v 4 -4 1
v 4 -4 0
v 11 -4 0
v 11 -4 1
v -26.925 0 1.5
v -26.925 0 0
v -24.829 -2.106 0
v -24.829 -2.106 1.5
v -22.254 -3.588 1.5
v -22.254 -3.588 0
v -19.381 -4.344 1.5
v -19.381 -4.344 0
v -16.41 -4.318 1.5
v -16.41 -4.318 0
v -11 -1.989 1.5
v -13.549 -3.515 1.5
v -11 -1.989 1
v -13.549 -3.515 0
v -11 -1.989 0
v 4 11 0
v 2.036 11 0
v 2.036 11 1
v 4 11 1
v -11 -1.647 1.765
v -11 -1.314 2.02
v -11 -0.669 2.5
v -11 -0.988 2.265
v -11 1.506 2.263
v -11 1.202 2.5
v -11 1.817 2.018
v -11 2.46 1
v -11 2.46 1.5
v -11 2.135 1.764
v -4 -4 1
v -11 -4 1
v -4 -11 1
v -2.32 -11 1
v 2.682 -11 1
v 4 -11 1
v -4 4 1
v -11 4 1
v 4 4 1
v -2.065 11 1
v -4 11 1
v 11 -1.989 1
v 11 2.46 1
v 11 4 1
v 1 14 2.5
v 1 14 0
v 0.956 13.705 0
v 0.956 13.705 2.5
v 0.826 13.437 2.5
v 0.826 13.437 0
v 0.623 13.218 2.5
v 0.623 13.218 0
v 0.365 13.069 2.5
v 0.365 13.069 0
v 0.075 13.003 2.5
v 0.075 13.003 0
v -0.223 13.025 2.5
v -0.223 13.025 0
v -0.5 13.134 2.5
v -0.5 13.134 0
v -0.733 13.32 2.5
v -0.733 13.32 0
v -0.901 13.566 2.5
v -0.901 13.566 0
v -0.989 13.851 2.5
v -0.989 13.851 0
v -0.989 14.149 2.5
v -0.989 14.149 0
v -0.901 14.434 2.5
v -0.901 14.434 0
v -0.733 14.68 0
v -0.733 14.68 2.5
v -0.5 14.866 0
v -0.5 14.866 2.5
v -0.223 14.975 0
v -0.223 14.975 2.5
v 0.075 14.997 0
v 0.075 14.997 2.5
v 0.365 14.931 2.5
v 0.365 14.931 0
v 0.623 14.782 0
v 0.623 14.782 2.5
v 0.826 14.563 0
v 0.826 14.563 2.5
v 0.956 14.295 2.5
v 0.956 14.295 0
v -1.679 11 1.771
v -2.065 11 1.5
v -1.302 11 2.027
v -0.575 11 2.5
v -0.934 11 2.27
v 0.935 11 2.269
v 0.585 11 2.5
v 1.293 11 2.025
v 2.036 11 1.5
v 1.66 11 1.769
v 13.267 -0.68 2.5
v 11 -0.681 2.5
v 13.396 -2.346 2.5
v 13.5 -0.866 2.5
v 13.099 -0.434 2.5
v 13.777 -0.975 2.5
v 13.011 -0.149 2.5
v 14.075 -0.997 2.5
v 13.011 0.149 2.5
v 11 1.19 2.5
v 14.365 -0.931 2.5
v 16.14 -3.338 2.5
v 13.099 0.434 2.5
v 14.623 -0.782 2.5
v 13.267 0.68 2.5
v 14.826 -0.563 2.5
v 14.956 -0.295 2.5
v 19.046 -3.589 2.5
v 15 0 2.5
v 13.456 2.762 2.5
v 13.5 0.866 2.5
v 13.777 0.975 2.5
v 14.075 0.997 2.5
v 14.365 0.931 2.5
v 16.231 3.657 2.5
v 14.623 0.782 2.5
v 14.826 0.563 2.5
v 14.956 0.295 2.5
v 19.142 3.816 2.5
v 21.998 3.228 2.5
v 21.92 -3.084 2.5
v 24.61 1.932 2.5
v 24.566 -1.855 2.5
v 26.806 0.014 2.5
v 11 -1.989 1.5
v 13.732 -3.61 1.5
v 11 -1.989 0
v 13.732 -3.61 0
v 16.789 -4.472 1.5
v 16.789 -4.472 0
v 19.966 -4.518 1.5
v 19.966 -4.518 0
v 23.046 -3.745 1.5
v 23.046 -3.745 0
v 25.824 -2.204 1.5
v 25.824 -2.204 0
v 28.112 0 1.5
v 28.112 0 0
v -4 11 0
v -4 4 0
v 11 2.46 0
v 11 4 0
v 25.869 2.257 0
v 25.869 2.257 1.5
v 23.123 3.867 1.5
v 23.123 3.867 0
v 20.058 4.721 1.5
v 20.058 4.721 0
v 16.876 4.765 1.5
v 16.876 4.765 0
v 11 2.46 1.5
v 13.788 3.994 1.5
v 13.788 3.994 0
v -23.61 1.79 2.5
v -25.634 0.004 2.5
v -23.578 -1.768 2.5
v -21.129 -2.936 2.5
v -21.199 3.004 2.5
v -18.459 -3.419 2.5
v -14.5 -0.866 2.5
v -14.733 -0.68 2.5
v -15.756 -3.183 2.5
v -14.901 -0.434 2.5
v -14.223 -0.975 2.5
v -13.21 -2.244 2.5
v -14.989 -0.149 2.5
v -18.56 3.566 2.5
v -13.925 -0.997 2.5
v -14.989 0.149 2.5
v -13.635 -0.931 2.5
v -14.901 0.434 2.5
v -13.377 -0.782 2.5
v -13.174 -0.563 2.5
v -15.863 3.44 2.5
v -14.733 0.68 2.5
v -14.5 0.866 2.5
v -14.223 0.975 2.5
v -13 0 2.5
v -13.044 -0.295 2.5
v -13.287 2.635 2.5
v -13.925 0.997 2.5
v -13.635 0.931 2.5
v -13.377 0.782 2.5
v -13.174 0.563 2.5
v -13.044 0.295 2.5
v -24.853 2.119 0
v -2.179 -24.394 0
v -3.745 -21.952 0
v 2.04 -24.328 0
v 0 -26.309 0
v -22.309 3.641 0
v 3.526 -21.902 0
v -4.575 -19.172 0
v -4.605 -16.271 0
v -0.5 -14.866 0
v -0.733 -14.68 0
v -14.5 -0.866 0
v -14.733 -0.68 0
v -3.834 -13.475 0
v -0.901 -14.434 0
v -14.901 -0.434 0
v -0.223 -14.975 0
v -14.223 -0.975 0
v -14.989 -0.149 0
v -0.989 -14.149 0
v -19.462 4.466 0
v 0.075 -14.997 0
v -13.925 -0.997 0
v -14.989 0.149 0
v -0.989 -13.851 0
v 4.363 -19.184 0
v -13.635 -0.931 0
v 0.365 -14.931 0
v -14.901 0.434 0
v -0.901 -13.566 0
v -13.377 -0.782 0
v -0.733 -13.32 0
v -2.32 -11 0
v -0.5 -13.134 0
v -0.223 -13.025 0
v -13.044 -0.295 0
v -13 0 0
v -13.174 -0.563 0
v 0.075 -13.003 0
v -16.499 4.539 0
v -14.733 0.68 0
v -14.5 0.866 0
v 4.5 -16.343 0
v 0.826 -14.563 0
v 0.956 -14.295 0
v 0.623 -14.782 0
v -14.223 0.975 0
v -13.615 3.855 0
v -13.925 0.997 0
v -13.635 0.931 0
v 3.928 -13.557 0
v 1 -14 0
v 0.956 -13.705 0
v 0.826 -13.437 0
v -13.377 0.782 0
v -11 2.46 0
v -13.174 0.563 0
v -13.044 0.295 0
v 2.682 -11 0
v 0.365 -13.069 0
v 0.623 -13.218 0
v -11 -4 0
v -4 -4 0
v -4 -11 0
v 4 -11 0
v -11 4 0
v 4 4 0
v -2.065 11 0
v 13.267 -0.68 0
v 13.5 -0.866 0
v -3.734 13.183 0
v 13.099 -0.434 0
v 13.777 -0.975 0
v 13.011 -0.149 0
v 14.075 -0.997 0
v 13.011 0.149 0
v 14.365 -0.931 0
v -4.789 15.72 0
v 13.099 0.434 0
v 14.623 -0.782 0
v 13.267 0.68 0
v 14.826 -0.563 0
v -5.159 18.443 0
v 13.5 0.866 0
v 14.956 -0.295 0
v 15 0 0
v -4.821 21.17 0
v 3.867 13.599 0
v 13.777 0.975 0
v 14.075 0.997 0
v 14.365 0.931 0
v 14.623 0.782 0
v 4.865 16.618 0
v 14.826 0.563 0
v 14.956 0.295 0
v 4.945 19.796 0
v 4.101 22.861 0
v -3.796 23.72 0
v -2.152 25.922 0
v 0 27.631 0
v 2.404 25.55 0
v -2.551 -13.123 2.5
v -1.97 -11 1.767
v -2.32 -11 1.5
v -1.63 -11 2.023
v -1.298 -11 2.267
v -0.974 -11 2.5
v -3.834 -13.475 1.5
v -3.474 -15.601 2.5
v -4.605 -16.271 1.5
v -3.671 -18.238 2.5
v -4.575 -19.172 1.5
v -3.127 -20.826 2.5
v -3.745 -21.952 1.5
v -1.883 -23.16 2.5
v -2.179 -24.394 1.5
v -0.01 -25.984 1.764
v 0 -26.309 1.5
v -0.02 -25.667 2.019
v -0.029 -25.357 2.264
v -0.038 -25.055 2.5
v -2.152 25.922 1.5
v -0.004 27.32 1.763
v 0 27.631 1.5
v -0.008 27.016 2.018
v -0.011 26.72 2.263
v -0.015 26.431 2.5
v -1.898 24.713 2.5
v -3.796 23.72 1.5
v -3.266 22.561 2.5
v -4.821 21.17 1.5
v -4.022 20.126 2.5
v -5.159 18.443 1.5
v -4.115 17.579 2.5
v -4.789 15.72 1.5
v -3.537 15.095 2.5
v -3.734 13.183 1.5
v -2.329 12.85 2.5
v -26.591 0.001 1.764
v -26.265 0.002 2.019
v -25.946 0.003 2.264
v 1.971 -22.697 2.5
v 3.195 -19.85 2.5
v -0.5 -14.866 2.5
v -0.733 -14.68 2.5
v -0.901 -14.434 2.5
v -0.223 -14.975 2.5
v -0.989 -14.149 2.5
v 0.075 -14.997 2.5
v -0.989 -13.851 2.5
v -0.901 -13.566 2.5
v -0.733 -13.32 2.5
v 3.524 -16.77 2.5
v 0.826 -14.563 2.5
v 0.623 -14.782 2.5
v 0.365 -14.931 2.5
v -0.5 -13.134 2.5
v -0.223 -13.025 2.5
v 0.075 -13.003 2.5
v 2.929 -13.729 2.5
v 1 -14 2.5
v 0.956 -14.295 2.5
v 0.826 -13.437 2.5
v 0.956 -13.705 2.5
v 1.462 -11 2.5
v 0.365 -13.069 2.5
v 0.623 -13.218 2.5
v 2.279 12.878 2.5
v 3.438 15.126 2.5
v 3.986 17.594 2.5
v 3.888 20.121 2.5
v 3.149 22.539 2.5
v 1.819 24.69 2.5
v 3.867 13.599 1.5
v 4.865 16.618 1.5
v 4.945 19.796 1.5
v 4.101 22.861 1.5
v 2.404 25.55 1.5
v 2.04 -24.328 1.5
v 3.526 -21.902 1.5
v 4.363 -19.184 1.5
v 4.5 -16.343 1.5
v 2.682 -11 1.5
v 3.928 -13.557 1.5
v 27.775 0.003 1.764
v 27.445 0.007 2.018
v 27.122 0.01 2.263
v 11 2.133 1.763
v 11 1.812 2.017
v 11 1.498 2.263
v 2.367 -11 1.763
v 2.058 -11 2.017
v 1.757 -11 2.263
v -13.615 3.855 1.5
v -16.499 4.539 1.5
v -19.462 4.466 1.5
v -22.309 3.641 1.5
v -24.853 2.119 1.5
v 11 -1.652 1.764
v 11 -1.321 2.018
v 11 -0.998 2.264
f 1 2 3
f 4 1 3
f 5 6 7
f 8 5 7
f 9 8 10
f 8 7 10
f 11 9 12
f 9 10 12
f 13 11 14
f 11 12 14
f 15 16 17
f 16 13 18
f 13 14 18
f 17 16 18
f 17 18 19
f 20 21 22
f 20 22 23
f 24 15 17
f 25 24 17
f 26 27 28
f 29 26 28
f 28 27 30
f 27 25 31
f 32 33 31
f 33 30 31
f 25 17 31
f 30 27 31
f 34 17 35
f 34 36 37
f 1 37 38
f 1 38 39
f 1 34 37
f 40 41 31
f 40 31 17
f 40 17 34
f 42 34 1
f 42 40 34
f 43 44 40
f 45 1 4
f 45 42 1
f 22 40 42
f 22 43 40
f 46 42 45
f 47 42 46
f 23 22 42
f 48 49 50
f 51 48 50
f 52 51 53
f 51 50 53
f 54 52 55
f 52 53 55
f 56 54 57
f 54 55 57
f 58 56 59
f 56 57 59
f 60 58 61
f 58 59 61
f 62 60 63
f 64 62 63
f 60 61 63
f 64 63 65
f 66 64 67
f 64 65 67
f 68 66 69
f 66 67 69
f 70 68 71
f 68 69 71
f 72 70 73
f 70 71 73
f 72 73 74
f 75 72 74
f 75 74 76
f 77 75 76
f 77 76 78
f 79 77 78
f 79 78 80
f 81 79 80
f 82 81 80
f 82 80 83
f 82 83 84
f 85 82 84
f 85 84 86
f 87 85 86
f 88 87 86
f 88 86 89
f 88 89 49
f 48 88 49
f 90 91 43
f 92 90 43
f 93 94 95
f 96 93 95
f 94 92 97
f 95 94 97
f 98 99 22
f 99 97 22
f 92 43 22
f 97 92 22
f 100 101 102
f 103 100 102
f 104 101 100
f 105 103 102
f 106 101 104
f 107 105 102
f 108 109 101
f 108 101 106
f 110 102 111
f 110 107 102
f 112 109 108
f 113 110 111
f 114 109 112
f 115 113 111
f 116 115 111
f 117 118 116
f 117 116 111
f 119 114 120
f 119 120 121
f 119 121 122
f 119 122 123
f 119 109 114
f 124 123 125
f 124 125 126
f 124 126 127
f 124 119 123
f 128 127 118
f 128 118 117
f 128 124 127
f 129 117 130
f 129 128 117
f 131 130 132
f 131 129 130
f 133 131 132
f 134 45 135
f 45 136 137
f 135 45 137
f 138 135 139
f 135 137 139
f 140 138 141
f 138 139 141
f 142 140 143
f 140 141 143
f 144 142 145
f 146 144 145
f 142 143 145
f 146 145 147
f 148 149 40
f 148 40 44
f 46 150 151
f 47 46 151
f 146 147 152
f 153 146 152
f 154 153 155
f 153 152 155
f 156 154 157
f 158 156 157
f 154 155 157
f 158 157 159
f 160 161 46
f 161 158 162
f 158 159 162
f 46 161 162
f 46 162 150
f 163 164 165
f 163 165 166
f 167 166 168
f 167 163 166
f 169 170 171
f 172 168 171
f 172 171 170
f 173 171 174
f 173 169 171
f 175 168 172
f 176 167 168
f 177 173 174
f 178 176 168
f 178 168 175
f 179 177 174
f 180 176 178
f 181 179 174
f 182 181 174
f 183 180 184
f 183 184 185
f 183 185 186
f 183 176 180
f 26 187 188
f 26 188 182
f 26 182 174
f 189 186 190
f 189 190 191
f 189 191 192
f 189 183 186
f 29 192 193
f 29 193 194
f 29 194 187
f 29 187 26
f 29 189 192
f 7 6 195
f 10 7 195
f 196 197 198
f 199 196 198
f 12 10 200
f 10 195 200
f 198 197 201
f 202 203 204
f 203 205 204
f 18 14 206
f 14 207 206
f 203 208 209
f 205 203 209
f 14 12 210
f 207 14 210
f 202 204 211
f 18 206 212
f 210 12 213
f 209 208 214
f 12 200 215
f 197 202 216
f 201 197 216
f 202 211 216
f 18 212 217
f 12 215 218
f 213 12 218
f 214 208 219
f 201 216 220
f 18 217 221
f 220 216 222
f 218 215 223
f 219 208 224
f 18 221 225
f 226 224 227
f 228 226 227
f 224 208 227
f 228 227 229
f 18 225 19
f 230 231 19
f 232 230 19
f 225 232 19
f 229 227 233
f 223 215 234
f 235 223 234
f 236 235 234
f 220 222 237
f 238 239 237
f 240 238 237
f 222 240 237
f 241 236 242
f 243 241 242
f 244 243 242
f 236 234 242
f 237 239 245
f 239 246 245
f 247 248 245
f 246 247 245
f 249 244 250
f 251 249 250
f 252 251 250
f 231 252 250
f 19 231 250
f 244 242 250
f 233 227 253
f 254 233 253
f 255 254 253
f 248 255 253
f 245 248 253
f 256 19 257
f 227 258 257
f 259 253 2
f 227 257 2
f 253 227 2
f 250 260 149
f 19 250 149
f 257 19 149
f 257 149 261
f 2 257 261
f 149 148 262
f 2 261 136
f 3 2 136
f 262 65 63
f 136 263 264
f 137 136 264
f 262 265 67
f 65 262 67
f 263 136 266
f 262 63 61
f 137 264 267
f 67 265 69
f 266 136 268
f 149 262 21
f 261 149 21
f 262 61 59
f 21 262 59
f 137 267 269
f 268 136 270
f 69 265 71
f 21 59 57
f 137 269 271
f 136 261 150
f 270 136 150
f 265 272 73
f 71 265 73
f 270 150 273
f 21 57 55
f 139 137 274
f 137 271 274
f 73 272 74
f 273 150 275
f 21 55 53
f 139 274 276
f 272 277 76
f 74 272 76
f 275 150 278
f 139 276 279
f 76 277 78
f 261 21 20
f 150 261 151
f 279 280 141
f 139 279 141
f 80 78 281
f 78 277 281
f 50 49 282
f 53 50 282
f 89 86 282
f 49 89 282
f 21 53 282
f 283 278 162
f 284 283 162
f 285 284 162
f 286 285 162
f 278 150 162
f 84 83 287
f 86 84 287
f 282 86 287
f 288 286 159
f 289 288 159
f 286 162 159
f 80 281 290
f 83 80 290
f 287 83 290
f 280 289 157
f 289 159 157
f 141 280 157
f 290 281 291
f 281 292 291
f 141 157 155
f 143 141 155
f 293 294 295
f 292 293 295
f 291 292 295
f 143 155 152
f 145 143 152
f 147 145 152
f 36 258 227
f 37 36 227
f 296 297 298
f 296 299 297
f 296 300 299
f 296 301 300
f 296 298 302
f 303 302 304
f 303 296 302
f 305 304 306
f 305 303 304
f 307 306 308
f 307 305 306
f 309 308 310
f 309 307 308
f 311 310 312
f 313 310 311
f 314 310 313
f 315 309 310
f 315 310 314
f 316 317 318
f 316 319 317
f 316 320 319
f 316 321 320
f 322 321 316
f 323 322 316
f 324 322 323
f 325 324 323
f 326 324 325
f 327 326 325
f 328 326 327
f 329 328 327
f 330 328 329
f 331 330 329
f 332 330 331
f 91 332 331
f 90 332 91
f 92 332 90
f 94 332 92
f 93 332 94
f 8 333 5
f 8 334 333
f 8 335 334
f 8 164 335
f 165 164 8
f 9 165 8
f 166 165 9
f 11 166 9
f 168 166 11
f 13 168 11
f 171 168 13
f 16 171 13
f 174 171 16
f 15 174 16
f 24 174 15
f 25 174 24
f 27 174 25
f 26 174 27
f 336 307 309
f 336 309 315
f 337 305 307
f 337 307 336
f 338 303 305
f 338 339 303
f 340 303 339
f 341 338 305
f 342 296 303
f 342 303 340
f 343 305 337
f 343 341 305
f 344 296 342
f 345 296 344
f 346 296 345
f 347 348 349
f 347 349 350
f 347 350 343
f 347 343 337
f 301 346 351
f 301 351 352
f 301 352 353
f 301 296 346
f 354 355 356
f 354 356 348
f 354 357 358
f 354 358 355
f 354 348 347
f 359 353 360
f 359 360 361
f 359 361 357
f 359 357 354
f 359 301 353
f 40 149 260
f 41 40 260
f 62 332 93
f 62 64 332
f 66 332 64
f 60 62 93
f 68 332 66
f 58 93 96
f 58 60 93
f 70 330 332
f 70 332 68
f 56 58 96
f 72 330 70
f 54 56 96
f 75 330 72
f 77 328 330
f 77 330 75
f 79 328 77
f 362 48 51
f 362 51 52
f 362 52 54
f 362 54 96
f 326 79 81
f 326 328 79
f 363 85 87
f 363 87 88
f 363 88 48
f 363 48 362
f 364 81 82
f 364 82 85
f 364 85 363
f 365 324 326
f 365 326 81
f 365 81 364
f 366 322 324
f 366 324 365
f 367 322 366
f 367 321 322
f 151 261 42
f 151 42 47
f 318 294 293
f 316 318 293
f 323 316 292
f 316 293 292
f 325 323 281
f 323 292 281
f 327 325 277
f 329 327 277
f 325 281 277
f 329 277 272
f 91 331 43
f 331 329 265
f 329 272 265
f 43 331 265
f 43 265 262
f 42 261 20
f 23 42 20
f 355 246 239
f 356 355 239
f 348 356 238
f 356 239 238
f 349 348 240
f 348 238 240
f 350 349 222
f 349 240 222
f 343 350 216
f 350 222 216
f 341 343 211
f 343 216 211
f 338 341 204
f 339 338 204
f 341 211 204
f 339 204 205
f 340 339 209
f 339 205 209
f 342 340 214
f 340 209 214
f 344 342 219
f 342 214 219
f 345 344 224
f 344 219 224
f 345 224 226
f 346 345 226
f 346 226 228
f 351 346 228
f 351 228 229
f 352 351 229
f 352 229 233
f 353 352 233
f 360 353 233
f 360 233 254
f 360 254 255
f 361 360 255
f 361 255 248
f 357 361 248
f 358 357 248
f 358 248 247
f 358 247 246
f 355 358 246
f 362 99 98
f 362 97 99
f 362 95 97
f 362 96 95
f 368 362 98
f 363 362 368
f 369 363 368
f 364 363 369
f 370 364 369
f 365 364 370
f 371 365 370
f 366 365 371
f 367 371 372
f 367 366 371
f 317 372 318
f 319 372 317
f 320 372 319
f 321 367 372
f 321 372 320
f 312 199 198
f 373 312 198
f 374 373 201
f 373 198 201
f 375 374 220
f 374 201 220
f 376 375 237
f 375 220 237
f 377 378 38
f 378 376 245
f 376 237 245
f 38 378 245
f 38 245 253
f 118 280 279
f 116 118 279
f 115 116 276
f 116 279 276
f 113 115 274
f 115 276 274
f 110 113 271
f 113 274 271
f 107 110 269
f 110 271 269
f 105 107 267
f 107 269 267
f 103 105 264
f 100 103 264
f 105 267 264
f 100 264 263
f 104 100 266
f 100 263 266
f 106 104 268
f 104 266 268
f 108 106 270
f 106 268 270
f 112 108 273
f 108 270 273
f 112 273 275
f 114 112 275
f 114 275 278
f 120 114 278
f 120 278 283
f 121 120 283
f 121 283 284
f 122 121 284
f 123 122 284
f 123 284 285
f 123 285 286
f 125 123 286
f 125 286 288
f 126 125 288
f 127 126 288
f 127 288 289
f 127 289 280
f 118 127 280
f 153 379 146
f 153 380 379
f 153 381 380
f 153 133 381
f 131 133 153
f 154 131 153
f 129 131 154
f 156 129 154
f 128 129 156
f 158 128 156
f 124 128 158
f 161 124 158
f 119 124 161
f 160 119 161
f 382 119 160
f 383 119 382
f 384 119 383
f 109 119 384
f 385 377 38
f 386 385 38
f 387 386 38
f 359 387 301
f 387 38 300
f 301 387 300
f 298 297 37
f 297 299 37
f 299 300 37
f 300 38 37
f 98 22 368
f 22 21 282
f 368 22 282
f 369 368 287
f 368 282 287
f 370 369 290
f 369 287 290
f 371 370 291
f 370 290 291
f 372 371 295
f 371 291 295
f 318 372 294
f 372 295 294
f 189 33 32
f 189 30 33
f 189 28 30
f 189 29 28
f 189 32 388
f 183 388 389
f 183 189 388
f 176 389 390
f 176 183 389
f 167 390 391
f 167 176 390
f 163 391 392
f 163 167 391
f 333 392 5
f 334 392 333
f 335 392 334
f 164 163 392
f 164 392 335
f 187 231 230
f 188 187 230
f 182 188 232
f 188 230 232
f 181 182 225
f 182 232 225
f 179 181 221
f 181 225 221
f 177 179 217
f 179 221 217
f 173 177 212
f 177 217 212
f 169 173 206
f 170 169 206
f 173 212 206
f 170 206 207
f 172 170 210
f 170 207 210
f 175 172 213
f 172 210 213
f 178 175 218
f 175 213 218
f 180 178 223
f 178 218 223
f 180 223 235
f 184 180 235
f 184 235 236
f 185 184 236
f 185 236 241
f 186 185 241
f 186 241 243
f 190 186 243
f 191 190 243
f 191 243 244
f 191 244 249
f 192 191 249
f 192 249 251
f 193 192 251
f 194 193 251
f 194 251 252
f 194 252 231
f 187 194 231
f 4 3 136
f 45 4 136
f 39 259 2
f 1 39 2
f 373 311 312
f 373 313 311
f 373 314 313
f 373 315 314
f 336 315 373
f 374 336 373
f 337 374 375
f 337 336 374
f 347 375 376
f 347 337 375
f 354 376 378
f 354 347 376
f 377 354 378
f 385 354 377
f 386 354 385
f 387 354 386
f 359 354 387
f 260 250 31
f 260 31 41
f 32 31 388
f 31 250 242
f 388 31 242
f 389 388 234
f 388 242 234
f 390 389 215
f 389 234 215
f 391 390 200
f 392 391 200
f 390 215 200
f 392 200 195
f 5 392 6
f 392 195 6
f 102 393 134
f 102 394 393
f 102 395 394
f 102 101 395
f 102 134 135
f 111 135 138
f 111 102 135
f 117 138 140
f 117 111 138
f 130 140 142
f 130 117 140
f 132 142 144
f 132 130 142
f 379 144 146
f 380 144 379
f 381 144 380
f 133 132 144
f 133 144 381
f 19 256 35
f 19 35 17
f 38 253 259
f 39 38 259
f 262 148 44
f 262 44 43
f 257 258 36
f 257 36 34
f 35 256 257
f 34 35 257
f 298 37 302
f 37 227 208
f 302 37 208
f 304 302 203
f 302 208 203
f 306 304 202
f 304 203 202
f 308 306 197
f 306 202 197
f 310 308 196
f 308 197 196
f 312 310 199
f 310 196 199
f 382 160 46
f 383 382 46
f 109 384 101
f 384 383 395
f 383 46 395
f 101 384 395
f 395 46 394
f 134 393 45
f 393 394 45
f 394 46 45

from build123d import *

# Parameters (mm, degrees)
F0_W     = 8
F0_H     = 8
F0_W_2   = 7
F0_H_2   = 7
F1_DEPTH = 1
F3_DEPTH = 2.5
F4_R     = 1
F5_DEPTH = 2.501
F6_SIZE  = 1


with BuildPart() as f1:
    # F0 (on Top) → F1 (new body)
    with BuildSketch(Plane.XY):
        Rectangle(F0_W, F0_H)
        with Locations((-7.5, 0)):
            Rectangle(F0_W_2, F0_H)
        with Locations((0, 7.5)):
            Rectangle(F0_W, F0_H_2)
        with Locations((0, -7.5)):
            Rectangle(F0_W, F0_H_2)
        with Locations((7.5, 0)):
            Rectangle(F0_W_2, F0_H)
    extrude(amount=F1_DEPTH)

    # F2 (on Top) → F3 (join)
    with BuildSketch(Plane.XY):
        with BuildLine():
            ThreePointArc((2.036100952, 11), (4.945464062, 19.7962570079), (0, 27.630854398))
            ThreePointArc((0, 27.630854398), (-5.0783073922, 19.8178102809), (-2.0651551895, 11))
            Line((-2.0651551895, 11), (2.036100952, 11))
        make_face()
        with BuildLine():
            Line((-11, -1.9892101258), (-11, 2.4604453852))
            ThreePointArc((-11, 2.4604453852), (-19.4622945933, 4.4658207731), (-26.9247610122, 0))
            ThreePointArc((-26.9247610122, 0), (-19.3807111434, -4.3435802853), (-11, -1.9892101258))
        make_face()
        with BuildLine():
            Line((2.6823603006, -11), (-2.3196401929, -11))
            ThreePointArc((-2.3196401929, -11), (-4.574812793, -19.1721128853), (0, -26.3093616813))
            ThreePointArc((0, -26.3093616813), (4.36279709, -19.1840997342), (2.6823603006, -11))
        make_face()
        with BuildLine():
            ThreePointArc((11, -1.9892101258), (19.9655151881, -4.5182315612), (28.1118024141, 0))
            ThreePointArc((28.1118024141, 0), (20.0578865698, 4.7214094483), (11, 2.4604453852))
            Line((11, 2.4604453852), (11, -1.9892101258))
        make_face()
    extrude(amount=F3_DEPTH)

    # F4 (on face) → F5 (cut, through all)
    with BuildSketch(Plane(origin=(0, 0, 0), x_dir=(1, 0, 0), z_dir=(0, 0, -1))):
        with Locations((0, 14)):
            Circle(F4_R)
        with Locations((-14, 0)):
            Circle(F4_R)
        with Locations((0, -14)):
            Circle(F4_R)
        with Locations((14, 0)):
            Circle(F4_R)
    extrude(amount=-F5_DEPTH, mode=Mode.SUBTRACT)

    # F6
    f6_edges = [f1.edges().sort_by_distance(p)[0] for p in [
        (-5.078307, 19.81781, 2.5),
        (4.945464, 19.796257, 2.5),
        (20.057887, 4.721409, 2.5),
        (4.362797, -19.1841, 2.5),
        (19.965515, -4.518232, 2.5),
        (-4.574813, -19.172113, 2.5),
        (-19.462295, 4.465821, 2.5),
        (-19.380711, -4.34358, 2.5),
    ]]
    chamfer(f6_edges, length=F6_SIZE)


solid = f1.part
